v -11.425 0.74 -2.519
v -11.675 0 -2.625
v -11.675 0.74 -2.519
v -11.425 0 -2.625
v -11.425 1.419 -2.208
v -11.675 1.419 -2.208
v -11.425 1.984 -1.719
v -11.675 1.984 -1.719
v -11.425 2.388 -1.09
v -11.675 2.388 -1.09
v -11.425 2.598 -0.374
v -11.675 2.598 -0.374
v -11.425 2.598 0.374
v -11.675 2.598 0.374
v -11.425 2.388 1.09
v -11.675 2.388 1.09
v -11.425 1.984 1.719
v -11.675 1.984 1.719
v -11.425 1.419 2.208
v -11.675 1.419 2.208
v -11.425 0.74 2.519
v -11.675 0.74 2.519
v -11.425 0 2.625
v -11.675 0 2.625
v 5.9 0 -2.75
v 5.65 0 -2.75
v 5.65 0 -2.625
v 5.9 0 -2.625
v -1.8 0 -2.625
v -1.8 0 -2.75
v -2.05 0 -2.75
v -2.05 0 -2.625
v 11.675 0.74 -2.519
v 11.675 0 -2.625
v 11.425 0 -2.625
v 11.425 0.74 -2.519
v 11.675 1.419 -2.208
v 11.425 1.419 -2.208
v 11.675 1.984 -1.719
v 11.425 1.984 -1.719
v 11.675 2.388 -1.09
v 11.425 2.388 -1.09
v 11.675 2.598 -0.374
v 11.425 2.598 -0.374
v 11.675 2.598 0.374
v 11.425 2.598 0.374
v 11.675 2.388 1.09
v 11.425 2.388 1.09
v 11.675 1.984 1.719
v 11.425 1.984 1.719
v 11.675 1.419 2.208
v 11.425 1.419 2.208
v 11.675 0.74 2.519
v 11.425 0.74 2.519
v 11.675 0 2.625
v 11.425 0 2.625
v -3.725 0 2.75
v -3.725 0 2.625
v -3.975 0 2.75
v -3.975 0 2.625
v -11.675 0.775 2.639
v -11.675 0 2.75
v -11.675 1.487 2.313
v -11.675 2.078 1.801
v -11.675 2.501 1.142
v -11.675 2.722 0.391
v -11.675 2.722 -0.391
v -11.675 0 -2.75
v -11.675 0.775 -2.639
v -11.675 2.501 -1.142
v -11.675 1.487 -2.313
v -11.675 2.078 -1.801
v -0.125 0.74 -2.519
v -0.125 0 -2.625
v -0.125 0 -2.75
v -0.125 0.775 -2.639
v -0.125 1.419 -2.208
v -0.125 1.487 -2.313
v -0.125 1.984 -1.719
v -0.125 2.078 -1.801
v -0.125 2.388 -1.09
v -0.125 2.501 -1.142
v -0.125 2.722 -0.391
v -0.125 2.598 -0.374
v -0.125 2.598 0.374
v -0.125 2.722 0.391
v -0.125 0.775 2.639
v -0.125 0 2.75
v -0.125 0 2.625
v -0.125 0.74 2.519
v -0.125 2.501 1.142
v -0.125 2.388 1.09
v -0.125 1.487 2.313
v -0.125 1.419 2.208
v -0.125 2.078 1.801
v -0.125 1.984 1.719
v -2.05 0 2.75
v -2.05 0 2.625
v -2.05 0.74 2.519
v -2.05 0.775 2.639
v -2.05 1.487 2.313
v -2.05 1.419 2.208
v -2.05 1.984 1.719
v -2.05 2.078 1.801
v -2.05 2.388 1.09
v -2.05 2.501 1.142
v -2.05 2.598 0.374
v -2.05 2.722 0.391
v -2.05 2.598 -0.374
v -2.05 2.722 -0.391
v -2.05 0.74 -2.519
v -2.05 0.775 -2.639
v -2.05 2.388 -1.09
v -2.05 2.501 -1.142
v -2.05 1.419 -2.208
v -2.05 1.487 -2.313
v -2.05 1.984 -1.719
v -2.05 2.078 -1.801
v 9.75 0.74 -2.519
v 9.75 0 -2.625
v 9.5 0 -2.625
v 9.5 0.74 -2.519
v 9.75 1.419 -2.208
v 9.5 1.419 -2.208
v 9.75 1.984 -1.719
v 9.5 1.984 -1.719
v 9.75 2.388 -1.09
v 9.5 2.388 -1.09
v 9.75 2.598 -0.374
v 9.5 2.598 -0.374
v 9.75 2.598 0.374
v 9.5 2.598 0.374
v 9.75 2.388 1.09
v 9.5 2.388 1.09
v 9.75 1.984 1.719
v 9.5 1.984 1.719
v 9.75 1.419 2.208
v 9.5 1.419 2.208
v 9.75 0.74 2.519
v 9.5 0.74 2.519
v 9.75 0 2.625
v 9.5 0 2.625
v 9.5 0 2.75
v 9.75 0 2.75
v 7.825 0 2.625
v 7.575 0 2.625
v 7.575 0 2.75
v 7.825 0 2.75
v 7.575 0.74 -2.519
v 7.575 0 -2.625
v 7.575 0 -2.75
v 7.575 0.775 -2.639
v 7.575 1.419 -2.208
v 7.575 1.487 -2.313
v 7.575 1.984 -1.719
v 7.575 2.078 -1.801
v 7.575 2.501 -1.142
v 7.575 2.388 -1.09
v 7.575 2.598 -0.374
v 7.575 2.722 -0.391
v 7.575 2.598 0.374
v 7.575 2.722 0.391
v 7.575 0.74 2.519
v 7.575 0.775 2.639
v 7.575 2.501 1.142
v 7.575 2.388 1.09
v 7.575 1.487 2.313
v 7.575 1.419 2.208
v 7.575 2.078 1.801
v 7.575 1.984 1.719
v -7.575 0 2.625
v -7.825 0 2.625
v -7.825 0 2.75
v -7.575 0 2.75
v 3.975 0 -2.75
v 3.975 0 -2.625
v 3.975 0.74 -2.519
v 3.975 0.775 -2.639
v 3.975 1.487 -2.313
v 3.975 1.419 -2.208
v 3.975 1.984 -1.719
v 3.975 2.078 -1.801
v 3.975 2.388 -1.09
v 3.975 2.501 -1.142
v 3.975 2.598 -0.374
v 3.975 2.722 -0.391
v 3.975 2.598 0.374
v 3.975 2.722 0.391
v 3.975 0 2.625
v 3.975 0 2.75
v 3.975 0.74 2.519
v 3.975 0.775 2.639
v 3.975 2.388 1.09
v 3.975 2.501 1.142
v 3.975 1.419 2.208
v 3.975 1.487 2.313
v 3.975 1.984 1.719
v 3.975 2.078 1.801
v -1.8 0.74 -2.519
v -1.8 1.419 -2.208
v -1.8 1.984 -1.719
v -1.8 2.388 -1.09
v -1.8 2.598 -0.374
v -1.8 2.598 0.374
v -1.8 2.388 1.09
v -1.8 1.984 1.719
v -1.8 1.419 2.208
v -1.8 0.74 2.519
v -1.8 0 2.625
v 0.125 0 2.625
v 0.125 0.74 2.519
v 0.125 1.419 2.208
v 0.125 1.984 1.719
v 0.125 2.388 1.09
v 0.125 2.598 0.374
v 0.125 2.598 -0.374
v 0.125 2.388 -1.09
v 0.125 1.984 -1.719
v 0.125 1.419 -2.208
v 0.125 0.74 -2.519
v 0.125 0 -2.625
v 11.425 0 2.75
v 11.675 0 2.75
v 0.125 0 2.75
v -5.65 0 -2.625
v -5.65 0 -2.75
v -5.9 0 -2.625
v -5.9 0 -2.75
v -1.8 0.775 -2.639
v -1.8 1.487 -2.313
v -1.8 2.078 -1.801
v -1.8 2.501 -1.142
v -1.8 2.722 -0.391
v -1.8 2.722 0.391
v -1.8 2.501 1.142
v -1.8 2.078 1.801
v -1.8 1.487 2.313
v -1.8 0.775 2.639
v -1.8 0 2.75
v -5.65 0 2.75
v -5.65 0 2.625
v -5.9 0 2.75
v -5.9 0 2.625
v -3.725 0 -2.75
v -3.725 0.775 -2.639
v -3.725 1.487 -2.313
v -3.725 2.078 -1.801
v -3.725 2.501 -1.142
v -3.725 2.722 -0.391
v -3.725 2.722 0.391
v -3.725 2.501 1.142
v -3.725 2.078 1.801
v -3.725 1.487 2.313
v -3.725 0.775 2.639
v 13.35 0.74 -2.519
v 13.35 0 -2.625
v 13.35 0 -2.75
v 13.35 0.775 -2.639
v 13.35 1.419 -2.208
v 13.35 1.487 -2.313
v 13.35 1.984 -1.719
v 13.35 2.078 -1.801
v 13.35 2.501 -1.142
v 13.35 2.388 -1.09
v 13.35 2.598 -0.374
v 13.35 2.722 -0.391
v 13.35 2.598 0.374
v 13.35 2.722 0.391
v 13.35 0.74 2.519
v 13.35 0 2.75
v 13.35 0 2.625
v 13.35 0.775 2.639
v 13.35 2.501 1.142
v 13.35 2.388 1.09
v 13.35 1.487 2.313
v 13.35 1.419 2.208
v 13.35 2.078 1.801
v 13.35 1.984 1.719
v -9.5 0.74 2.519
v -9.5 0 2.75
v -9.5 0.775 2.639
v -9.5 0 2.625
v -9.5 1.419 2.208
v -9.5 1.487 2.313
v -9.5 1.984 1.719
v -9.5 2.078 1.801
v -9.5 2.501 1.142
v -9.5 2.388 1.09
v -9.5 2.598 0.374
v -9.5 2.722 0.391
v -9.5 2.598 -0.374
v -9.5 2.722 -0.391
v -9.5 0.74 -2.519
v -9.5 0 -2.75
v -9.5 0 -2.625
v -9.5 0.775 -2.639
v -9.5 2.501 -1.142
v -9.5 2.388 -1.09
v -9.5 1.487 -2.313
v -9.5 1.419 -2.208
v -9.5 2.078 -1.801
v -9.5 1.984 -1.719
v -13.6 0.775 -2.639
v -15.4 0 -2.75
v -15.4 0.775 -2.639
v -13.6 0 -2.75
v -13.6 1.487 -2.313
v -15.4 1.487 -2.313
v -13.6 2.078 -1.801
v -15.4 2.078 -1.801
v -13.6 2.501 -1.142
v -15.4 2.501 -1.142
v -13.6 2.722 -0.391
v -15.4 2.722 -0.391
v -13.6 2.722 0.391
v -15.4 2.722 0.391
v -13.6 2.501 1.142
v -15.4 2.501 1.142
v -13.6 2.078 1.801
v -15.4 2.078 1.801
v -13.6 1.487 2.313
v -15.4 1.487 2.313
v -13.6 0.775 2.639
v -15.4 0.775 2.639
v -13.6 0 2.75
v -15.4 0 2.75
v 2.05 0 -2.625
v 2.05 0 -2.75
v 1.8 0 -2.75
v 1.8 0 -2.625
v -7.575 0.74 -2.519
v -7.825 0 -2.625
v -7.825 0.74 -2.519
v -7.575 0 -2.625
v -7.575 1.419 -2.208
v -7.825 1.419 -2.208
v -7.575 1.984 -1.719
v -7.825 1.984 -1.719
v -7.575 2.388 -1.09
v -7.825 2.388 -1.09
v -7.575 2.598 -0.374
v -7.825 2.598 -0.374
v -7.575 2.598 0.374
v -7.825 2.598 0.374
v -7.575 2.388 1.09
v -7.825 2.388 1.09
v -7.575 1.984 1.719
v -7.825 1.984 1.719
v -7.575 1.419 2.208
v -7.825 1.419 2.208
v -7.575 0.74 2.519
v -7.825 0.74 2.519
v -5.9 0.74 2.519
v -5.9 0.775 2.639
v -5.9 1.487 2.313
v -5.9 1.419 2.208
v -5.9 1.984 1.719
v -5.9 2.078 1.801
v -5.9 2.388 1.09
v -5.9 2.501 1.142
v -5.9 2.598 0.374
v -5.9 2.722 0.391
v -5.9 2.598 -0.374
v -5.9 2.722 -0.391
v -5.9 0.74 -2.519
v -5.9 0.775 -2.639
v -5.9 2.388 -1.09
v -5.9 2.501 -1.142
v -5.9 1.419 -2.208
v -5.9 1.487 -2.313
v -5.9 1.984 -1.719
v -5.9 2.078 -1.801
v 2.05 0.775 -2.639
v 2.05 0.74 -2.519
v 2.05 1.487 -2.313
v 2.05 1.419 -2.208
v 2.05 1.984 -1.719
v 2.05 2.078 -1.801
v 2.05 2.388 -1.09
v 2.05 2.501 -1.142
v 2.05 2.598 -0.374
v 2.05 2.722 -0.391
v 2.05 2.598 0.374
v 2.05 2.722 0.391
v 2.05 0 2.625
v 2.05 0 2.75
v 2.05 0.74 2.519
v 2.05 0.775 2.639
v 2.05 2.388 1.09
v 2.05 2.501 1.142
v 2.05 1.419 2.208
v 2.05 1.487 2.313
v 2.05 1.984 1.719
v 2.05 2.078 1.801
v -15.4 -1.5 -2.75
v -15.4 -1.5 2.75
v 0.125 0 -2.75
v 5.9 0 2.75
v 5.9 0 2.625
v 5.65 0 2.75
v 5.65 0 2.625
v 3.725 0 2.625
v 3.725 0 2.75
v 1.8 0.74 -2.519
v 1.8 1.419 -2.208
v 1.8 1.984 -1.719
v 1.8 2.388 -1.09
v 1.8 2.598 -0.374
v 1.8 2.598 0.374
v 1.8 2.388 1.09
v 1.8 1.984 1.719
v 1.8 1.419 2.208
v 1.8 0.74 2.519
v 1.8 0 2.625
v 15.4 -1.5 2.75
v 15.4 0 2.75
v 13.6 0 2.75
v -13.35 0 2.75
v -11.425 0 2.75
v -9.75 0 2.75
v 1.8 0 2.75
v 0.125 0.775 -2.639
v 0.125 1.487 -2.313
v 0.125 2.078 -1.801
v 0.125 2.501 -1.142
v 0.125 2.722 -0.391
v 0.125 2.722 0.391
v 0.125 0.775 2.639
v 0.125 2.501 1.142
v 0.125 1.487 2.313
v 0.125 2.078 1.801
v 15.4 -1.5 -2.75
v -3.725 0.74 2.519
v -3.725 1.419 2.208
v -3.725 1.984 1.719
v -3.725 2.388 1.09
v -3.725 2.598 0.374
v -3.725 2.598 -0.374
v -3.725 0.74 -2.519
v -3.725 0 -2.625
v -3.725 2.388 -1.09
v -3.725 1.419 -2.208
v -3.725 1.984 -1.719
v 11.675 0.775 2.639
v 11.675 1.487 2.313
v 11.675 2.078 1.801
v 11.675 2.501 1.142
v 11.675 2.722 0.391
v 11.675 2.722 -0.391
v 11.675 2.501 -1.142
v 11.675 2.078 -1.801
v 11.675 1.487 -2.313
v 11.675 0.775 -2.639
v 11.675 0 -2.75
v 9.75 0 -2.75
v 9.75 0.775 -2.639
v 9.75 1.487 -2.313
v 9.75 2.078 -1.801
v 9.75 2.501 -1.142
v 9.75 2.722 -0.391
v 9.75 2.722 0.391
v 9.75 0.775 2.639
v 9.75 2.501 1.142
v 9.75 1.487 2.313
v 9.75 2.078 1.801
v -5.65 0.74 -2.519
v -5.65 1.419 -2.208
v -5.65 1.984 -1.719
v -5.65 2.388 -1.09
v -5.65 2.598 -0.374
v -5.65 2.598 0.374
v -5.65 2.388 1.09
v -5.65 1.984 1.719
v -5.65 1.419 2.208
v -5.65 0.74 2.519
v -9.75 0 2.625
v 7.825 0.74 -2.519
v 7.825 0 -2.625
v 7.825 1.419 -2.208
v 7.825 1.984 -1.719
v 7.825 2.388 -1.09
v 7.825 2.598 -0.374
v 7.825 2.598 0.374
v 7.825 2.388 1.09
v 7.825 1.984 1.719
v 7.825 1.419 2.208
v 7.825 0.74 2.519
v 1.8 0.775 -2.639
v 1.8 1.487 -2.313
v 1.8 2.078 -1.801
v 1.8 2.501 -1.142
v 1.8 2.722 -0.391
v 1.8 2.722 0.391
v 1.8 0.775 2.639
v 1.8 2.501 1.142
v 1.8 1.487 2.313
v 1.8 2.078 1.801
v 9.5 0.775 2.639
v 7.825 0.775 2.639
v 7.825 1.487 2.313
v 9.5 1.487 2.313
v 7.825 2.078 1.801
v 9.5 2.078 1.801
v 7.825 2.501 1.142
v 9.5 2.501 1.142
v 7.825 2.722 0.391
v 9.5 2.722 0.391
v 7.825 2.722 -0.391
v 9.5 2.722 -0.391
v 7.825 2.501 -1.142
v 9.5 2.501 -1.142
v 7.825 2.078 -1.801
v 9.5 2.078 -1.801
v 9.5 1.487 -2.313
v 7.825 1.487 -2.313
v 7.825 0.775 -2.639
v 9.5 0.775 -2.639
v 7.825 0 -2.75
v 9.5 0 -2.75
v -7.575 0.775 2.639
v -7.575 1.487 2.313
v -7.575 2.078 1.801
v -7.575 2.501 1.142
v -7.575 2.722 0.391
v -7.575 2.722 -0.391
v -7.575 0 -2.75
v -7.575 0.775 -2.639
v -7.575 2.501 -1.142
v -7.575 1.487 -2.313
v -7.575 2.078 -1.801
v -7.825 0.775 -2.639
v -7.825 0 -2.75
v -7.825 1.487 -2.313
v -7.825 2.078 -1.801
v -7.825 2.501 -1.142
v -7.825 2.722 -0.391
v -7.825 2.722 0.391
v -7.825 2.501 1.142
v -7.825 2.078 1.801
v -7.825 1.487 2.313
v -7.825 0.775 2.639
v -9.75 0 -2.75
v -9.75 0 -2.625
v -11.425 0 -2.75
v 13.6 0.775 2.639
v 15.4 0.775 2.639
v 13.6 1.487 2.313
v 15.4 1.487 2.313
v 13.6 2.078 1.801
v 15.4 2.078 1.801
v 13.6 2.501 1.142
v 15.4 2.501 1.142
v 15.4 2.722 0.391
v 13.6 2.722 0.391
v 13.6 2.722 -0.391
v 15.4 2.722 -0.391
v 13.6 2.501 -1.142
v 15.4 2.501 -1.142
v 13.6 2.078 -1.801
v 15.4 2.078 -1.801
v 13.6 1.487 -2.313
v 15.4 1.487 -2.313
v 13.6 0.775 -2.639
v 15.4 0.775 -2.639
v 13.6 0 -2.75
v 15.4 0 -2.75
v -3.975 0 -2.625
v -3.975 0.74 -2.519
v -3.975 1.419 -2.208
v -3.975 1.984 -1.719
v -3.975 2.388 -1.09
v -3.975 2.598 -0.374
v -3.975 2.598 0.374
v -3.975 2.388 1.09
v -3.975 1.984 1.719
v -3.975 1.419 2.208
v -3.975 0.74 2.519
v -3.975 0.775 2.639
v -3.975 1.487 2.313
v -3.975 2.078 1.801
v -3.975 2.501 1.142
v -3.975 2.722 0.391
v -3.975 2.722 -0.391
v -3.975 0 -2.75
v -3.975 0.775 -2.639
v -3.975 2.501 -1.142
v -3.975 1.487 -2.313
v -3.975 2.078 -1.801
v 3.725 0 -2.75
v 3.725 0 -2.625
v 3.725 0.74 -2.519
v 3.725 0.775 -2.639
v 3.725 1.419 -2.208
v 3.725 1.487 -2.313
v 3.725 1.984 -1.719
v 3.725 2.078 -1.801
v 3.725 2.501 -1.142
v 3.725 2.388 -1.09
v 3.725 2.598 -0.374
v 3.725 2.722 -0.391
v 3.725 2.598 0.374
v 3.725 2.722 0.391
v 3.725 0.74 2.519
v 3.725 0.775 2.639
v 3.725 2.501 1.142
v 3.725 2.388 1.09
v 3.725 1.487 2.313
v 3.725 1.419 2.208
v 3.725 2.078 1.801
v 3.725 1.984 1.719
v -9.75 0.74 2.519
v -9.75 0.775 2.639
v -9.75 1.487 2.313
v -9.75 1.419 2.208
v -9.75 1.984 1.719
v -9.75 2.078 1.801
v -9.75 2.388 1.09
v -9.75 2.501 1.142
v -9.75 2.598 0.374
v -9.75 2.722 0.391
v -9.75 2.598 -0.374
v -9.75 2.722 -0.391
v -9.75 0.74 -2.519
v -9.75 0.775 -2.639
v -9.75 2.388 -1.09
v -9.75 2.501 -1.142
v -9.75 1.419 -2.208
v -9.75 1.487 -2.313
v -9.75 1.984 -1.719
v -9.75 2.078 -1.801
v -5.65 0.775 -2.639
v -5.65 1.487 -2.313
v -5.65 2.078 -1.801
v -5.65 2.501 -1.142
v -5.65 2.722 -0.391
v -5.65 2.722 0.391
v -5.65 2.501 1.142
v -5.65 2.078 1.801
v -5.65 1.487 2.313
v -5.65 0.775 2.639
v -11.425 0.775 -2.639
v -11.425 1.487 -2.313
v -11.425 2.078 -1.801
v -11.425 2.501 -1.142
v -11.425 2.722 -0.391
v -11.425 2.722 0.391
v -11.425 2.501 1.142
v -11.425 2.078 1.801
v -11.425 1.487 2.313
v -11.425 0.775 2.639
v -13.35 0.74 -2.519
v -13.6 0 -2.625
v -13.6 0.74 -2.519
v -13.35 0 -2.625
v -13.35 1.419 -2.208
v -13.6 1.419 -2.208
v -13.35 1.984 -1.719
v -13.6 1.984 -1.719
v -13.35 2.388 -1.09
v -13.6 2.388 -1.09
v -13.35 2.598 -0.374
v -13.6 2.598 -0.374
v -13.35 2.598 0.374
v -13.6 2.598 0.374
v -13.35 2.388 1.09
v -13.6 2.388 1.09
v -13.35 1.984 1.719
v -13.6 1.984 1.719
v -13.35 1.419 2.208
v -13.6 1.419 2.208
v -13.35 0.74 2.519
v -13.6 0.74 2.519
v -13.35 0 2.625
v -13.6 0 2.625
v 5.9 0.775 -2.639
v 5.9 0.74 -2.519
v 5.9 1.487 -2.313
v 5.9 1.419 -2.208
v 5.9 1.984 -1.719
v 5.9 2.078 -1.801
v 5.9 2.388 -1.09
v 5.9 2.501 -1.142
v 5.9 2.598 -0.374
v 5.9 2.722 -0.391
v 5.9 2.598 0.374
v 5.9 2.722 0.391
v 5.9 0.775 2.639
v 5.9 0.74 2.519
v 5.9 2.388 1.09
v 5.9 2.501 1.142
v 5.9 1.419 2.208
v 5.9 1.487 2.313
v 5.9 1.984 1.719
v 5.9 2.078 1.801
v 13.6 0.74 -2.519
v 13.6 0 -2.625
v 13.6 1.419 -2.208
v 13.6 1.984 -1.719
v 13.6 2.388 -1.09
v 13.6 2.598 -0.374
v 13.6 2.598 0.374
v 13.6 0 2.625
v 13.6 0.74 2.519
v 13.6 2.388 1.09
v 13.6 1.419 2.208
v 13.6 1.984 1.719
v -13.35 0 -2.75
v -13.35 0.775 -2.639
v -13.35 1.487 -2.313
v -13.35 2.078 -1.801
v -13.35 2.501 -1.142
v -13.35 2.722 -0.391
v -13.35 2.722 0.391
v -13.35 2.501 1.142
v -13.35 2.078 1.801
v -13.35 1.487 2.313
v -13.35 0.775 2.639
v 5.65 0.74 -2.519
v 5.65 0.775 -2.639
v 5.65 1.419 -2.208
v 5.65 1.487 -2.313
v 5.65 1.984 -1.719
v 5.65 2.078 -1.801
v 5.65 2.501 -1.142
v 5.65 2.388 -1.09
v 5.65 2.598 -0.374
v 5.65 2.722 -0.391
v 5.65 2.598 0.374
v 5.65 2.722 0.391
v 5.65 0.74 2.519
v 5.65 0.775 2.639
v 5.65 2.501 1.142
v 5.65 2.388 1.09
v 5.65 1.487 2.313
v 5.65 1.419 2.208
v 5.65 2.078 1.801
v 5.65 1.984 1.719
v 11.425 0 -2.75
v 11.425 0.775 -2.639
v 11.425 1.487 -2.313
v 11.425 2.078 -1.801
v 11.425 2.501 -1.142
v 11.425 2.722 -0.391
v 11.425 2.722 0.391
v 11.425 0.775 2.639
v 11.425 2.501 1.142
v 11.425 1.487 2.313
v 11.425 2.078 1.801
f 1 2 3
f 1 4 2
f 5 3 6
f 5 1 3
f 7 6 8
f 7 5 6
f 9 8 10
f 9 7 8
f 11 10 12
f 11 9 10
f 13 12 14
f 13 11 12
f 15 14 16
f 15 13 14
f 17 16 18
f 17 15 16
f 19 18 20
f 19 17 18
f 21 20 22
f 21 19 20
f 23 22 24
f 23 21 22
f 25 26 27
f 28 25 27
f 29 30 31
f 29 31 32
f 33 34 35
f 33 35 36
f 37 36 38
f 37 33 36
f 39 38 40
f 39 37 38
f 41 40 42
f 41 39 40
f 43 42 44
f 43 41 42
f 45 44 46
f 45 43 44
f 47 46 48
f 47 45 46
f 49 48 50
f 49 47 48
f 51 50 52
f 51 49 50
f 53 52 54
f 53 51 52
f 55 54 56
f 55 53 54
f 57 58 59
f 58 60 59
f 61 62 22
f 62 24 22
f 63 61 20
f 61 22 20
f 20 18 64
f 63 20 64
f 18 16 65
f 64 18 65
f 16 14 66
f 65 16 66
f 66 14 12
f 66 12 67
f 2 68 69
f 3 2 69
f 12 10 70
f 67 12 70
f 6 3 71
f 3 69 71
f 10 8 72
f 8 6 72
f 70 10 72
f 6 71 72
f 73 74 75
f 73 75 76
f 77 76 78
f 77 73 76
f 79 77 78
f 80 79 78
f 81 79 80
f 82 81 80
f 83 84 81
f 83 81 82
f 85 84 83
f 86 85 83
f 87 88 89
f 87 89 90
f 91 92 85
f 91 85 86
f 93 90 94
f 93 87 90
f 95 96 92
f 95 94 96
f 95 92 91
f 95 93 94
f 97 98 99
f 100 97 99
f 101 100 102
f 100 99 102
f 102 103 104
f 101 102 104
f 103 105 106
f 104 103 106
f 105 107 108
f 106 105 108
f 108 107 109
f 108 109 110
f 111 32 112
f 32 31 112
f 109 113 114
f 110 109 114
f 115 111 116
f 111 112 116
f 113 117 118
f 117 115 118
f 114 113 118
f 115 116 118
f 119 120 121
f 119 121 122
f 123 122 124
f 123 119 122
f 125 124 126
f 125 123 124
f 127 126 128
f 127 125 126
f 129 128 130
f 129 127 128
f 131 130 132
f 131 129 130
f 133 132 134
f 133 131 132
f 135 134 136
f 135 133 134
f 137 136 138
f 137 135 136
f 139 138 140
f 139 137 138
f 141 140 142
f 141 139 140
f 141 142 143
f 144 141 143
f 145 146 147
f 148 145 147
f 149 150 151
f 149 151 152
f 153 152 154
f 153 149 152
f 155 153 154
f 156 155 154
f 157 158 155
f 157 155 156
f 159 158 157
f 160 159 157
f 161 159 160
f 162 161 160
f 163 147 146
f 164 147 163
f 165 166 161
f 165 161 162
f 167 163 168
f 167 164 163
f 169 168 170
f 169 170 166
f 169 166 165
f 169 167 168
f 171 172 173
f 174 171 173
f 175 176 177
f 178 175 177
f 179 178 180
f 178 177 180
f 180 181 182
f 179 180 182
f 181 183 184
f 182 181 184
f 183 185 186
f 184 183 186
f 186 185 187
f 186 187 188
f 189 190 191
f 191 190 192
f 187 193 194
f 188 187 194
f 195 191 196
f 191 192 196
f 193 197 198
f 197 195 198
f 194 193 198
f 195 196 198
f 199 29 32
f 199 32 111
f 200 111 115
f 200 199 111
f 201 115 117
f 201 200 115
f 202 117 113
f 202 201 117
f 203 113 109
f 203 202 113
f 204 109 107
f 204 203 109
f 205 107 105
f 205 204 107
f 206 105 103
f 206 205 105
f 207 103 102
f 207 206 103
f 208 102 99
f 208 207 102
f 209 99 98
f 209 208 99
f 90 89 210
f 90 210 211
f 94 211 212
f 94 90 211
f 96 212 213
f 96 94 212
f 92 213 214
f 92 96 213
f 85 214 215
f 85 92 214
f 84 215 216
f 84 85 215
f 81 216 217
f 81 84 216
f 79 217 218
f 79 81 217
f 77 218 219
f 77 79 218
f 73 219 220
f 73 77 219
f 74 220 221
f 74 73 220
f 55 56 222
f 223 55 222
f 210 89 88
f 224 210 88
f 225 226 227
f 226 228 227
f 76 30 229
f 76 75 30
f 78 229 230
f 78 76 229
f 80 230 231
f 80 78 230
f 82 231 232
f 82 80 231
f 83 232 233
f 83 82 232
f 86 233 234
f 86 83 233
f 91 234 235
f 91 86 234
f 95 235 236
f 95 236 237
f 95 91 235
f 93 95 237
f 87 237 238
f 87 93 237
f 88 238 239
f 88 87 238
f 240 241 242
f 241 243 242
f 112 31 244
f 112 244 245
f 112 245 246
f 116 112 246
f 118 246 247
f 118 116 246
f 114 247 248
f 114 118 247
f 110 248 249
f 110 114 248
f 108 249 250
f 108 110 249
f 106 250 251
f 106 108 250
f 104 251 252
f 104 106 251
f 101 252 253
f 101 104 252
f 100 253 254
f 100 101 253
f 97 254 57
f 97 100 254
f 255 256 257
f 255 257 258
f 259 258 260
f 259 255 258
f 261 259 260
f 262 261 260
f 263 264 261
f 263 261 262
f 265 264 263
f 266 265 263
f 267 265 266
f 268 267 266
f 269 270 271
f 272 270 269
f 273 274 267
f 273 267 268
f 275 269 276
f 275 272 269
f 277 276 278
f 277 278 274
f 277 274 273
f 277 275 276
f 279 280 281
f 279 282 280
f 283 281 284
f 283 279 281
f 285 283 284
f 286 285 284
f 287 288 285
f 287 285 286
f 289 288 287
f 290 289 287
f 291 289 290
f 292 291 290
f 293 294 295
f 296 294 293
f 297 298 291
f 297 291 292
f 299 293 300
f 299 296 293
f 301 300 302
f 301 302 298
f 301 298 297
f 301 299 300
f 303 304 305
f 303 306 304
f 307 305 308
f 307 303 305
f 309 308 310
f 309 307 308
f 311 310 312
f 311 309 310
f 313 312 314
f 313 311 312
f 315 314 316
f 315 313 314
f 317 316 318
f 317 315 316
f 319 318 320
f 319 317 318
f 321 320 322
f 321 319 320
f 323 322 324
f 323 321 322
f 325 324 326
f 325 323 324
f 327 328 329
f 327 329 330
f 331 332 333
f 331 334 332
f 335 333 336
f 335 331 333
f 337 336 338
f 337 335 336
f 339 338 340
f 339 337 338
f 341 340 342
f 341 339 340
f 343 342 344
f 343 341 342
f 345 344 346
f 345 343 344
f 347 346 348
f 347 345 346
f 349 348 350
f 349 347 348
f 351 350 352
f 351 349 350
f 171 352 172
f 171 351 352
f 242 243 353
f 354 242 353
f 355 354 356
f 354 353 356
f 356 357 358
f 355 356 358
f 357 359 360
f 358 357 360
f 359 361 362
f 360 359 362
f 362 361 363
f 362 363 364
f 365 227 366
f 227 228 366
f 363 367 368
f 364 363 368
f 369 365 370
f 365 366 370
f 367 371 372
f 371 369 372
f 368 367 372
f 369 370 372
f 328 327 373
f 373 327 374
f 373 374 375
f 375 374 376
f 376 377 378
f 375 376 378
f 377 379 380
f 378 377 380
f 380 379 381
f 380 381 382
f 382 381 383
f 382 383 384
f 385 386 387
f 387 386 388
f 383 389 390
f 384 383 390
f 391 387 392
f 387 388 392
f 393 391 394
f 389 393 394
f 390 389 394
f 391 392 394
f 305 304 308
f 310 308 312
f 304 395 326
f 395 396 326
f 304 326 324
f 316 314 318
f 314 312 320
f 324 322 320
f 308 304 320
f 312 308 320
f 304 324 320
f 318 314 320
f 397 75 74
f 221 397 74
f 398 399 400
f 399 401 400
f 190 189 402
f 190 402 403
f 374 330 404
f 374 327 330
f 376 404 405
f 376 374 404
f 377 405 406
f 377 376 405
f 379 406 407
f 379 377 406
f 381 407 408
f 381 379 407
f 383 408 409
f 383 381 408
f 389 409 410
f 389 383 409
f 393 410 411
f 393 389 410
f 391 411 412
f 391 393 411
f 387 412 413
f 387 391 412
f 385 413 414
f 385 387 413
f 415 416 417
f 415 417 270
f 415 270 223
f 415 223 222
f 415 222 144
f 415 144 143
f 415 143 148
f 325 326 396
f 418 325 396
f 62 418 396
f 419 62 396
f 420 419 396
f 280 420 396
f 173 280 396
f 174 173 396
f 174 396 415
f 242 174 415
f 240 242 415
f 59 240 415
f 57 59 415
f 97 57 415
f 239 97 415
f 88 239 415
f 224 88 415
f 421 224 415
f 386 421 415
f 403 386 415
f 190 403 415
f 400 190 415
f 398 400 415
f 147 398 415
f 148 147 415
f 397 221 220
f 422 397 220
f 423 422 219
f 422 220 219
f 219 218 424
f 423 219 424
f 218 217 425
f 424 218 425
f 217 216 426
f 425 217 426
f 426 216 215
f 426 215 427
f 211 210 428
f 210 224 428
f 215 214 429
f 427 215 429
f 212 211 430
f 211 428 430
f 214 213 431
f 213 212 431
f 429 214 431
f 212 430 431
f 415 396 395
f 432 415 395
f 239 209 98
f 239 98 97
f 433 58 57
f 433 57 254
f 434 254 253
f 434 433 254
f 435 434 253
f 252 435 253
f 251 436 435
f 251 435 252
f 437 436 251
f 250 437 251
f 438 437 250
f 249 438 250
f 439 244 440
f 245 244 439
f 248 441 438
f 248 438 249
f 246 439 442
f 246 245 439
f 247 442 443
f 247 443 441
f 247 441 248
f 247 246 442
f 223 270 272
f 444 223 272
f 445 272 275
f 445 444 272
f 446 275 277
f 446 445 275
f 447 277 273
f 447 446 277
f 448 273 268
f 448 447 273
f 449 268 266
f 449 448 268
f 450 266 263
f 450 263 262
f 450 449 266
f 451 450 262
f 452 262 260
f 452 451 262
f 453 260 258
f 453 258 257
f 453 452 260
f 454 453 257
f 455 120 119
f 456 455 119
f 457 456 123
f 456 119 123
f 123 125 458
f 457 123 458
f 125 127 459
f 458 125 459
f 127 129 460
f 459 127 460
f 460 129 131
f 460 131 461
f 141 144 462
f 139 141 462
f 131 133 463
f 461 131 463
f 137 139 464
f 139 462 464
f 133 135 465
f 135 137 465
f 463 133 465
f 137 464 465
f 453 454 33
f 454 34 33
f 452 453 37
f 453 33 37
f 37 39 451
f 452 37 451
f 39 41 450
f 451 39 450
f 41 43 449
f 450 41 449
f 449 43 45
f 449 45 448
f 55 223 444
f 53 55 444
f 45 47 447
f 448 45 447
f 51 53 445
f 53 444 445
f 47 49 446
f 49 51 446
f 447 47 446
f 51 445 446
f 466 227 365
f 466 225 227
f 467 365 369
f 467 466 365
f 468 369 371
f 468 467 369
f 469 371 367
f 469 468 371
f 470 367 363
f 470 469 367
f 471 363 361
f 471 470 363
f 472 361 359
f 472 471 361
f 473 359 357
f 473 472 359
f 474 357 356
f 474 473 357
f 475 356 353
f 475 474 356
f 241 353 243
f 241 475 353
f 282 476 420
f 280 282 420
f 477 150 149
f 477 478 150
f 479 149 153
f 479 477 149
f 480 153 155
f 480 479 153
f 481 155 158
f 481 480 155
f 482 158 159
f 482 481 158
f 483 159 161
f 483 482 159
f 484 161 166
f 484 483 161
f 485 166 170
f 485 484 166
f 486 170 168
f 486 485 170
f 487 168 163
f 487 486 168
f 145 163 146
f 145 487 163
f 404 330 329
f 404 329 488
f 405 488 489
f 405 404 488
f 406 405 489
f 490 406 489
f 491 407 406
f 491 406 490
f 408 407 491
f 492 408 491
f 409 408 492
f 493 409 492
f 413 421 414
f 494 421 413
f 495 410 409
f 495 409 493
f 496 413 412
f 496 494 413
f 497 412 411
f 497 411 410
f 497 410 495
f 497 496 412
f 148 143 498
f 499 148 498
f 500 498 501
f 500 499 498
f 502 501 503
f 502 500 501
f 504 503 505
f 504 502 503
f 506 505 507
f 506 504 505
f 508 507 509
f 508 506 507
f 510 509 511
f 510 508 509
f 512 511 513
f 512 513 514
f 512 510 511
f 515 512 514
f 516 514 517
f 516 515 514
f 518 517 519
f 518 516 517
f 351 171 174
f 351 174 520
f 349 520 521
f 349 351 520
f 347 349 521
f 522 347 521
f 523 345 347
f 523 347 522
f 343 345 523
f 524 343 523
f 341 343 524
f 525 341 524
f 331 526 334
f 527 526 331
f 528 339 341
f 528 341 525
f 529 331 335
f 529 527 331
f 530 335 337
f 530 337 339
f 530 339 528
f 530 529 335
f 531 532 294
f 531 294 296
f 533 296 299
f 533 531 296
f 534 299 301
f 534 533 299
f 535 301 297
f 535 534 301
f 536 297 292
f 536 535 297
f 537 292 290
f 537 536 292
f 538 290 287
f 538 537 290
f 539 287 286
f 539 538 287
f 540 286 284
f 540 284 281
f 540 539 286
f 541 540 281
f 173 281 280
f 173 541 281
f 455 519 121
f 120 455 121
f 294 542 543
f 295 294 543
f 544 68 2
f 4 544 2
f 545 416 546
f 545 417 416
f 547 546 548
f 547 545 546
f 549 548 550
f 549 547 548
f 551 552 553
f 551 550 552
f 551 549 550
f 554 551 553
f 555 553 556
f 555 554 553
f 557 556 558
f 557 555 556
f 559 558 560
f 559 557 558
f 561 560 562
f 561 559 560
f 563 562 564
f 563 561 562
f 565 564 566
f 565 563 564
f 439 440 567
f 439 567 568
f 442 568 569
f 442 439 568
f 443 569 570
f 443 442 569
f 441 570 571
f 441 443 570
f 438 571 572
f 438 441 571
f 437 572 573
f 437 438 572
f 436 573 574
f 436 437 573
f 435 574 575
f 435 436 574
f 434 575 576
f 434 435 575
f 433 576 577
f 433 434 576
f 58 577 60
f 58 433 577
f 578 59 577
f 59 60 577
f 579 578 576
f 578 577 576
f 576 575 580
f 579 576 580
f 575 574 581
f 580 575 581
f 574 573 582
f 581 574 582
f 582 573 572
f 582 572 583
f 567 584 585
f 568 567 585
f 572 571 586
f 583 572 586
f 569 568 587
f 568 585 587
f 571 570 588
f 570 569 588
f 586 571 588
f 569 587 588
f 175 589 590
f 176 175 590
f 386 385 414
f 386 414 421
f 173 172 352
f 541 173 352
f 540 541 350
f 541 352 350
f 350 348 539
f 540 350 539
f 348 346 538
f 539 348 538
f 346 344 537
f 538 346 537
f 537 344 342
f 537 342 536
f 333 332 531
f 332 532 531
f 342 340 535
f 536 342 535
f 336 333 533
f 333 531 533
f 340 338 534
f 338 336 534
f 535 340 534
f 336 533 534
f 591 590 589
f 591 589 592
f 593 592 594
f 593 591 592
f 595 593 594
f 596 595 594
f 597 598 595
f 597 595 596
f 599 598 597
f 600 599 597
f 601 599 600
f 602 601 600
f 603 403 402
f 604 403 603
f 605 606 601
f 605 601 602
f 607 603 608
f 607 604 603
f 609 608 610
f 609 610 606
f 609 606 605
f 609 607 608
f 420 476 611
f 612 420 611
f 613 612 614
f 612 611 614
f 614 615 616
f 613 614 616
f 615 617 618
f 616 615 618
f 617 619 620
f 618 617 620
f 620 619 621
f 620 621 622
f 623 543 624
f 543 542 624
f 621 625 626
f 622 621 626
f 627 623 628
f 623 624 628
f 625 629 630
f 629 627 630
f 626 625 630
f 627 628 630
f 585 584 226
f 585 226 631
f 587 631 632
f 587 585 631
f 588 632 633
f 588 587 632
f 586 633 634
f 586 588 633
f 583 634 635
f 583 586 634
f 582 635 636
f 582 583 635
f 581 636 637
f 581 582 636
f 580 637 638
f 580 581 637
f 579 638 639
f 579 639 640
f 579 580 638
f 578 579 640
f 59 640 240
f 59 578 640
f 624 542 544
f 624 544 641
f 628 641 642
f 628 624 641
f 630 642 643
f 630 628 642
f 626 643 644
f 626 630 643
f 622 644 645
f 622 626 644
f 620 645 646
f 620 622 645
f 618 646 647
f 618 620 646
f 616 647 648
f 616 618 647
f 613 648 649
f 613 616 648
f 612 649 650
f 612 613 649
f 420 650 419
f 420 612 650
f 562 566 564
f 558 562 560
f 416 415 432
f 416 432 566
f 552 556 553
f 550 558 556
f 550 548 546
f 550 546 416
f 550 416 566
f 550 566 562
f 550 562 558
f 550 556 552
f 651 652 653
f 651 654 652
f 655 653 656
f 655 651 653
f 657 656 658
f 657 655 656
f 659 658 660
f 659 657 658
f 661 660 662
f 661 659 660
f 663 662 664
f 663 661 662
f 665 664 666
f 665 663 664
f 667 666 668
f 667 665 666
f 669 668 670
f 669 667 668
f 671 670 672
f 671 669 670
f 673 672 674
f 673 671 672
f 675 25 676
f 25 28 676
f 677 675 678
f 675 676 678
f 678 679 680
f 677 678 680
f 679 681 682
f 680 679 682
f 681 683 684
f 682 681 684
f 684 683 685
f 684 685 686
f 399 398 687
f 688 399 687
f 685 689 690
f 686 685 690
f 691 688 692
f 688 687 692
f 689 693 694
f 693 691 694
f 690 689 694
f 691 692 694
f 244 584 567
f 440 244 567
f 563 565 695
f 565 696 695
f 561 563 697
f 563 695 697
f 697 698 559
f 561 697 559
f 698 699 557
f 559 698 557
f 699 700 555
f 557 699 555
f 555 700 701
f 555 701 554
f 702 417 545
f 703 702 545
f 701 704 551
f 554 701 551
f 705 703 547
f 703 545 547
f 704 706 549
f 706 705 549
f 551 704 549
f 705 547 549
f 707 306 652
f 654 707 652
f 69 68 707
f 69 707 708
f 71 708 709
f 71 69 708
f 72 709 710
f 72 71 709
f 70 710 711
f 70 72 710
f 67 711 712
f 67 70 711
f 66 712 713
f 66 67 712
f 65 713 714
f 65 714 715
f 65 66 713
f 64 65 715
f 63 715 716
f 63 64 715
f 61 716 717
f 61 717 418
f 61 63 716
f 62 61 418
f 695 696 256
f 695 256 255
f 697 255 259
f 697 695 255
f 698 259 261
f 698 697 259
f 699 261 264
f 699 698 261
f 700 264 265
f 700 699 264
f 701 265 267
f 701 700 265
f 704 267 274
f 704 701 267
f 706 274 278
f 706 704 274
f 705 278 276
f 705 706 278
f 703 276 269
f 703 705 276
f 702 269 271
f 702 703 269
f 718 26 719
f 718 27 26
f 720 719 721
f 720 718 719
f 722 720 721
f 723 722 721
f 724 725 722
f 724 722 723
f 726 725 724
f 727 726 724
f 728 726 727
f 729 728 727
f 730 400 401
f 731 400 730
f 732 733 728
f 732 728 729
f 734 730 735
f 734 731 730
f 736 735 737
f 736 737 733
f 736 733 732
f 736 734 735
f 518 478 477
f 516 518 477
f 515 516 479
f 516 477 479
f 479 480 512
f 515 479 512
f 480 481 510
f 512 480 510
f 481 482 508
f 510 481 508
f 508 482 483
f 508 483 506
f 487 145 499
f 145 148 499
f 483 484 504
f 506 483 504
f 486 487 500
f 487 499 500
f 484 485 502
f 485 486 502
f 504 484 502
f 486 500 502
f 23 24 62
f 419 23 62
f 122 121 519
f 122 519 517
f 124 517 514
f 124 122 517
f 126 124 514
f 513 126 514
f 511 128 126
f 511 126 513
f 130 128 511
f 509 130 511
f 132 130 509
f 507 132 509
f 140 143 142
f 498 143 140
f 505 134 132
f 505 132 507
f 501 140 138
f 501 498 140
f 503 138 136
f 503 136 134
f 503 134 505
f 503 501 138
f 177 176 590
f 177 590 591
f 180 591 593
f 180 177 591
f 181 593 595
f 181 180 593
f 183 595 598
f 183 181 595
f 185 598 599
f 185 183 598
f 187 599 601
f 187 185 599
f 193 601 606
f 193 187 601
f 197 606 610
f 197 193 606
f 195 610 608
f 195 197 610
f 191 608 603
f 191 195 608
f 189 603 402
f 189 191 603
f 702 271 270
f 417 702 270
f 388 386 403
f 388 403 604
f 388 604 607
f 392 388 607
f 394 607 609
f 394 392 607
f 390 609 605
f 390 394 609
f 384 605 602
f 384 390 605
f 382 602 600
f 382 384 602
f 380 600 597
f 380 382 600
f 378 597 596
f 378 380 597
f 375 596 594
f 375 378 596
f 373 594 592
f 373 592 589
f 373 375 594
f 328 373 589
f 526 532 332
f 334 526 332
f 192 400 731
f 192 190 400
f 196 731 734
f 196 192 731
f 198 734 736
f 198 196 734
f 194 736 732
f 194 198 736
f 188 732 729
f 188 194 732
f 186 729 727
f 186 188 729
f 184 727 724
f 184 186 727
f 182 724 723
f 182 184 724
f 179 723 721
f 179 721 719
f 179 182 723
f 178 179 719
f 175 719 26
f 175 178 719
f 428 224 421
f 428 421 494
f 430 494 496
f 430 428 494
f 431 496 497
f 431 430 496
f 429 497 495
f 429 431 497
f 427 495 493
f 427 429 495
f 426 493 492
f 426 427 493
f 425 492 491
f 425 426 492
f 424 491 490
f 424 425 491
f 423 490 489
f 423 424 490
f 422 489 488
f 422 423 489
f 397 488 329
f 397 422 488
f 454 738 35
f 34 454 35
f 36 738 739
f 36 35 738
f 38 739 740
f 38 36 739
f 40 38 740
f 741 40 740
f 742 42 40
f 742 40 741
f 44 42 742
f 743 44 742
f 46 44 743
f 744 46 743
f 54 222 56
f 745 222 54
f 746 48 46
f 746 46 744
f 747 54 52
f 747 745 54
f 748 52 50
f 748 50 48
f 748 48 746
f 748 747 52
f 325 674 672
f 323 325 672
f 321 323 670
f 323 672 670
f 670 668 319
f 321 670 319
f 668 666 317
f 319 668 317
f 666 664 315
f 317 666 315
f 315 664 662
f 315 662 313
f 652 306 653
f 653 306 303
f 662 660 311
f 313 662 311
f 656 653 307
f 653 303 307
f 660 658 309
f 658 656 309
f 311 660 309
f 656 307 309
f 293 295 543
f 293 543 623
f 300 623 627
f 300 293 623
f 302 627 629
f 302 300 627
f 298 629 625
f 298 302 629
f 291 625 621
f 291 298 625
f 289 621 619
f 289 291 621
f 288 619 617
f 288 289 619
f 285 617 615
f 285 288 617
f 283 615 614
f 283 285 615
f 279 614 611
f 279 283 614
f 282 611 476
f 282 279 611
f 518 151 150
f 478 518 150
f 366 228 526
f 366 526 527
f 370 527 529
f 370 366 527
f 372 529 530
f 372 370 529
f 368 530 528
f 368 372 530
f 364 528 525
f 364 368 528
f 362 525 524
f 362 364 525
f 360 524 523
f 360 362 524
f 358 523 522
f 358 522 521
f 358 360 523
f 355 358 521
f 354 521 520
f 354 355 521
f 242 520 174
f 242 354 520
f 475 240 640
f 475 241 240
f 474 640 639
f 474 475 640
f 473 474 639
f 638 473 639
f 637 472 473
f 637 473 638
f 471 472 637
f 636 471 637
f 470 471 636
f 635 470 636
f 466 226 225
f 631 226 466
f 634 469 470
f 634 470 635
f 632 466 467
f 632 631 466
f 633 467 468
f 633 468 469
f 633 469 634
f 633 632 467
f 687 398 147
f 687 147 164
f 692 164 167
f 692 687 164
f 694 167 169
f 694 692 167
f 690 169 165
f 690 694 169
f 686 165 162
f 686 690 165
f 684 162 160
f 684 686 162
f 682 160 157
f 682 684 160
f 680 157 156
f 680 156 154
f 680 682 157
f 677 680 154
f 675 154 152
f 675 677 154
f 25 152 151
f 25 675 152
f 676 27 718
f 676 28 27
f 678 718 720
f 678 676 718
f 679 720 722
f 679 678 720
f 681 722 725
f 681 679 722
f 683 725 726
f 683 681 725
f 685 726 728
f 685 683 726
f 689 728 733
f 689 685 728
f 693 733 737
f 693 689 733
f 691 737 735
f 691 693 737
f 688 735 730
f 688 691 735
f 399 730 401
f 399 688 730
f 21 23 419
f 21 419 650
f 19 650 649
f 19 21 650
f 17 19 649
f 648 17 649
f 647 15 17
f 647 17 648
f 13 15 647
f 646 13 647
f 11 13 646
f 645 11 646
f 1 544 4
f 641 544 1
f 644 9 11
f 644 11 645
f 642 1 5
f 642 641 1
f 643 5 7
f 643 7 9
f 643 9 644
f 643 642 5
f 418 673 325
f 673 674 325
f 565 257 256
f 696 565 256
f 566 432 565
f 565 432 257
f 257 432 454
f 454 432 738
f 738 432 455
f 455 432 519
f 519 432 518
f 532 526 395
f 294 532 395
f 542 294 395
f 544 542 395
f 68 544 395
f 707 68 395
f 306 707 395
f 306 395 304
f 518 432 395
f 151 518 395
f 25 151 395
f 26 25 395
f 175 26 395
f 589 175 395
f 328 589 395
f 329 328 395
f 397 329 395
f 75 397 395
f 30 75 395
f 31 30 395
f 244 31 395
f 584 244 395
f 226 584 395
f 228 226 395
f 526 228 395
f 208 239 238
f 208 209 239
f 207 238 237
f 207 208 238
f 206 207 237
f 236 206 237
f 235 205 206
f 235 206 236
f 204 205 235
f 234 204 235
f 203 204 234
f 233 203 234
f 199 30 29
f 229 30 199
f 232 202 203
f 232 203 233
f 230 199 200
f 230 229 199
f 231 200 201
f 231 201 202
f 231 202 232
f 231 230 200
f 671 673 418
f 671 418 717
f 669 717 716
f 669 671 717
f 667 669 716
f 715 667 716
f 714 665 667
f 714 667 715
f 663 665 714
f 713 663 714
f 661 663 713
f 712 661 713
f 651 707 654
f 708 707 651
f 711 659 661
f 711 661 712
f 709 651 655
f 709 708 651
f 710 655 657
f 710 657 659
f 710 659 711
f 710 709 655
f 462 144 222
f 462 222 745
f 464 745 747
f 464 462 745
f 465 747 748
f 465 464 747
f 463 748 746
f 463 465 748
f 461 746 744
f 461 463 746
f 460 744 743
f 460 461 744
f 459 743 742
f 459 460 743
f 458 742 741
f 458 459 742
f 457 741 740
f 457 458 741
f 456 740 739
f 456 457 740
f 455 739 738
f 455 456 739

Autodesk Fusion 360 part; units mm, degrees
sketch "Sketch1" plane through (0, 0, 0) normal (1, 0, 0) x (0, 1, 0)
  circle A0 centre (0, 0) radius 2.75
  line L0 (0, 0) -> (0, 2.75) construction
  line L1 (0, 0) -> (0, -2.75) construction
  line L2 (0, 2.75) -> (-1.5, 2.75)
  line L3 (-1.5, 2.75) -> (-1.5, -2.75)
  line L4 (-1.5, -2.75) -> (0, -2.75)
  line L5 (0, -2.75) -> (0, 2.75)
  dimension "d1" = 5.5
  dimension "d79" = 1.5
extrude "Extrude1" add sketch "Sketch1" along normal mid plane 30.8 contours A0 L5 | A0 L3 L5 | A0 L3
ref_plane "WorkPlane1" through (0, 0, 0) normal (1, 0, 0) x (0, 1, 0)
sketch "Sketch2" plane through (0, 0, 0) normal (1, 0, 0) x (0, 1, 0)
  circle A0 centre (0, 0) radius 2.75
  circle A1 centre (0, 0) radius 2.625
  dimension "d5" = 5.5
  dimension "d6" = 5.25
extrude "Extrude2" cut sketch "Sketch2" along normal mid plane 0.25
ref_plane "WorkPlane2" through (7.7, 0, 0) normal (1, 0, 0) x (0, 1, 0)
sketch "Sketch3" plane through (7.7, 0, 0) normal (1, 0, 0) x (0, 1, 0)
  circle A0 centre (0, 0) radius 2.75
  circle A1 centre (0, 0) radius 2.625
  dimension "d10" = 5.5
  dimension "d11" = 5.25
extrude "Extrude3" cut sketch "Sketch3" along normal mid plane 0.25
ref_plane "WorkPlane3" through (11.55, 0, 0) normal (1, 0, 0) x (0, 1, 0)
sketch "Sketch4" plane through (11.55, 0, 0) normal (1, 0, 0) x (0, 1, 0)
  circle A0 centre (0, 0) radius 2.75
  circle A1 centre (0, 0) radius 2.625
  dimension "d15" = 5.5
  dimension "d16" = 5.25
extrude "Extrude4" cut sketch "Sketch4" along normal mid plane 0.25
ref_plane "WorkPlane4" through (13.475, 0, 0) normal (1, 0, 0) x (0, 1, 0)
sketch "Sketch5" plane through (13.475, 0, 0) normal (1, 0, 0) x (0, 1, 0)
  circle A0 centre (0, 0) radius 2.75
  circle A1 centre (0, 0) radius 2.625
  dimension "d20" = 5.5
  dimension "d21" = 5.25
extrude "Extrude5" cut sketch "Sketch5" along normal mid plane 0.25
ref_plane "WorkPlane5" through (9.625, 0, 0) normal (1, 0, 0) x (0, 1, 0)
sketch "Sketch6" plane through (9.625, 0, 0) normal (1, 0, 0) x (0, 1, 0)
  circle A0 centre (0, 0) radius 2.75
  circle A1 centre (0, 0) radius 2.625
  dimension "d25" = 5.5
  dimension "d26" = 5.25
extrude "Extrude6" cut sketch "Sketch6" along normal mid plane 0.25
ref_plane "WorkPlane6" through (5.775, 0, 0) normal (1, 0, 0) x (0, 1, 0)
sketch "Sketch7" plane through (5.775, 0, 0) normal (1, 0, 0) x (0, 1, 0)
  circle A0 centre (0, 0) radius 2.75
  circle A1 centre (0, 0) radius 2.625
  dimension "d30" = 5.5
  dimension "d31" = 5.25
extrude "Extrude7" cut sketch "Sketch7" along normal mid plane 0.25
ref_plane "WorkPlane7" through (3.85, 0, 0) normal (1, 0, 0) x (0, 1, 0)
sketch "Sketch8" plane through (3.85, 0, 0) normal (1, 0, 0) x (0, 1, 0)
  circle A0 centre (0, 0) radius 2.75
  circle A1 centre (0, 0) radius 2.625
  dimension "d35" = 5.5
  dimension "d36" = 5.25
extrude "Extrude8" cut sketch "Sketch8" along normal mid plane 0.25
ref_plane "WorkPlane8" through (1.925, 0, 0) normal (1, 0, 0) x (0, 1, 0)
sketch "Sketch9" plane through (1.925, 0, 0) normal (1, 0, 0) x (0, 1, 0)
  circle A0 centre (0, 0) radius 2.75
  circle A1 centre (0, 0) radius 2.625
  dimension "d40" = 5.5
  dimension "d41" = 5.25
extrude "Extrude9" cut sketch "Sketch9" along normal mid plane 0.25
ref_plane "WorkPlane9" through (-13.475, 0, 0) normal (-1, 0, 0) x (0, -1, 0)
sketch "Sketch10" plane through (-13.475, 0, 0) normal (-1, 0, 0) x (0, 1, 0)
  circle A0 centre (0, 0) radius 2.75
  circle A1 centre (0, 0) radius 2.625
  dimension "d45" = 5.5
  dimension "d46" = 5.25
extrude "Extrude10" cut sketch "Sketch10" along normal mid plane 0.25
ref_plane "WorkPlane10" through (-11.55, 0, 0) normal (-1, 0, 0) x (0, -1, 0)
sketch "Sketch11" plane through (-11.55, 0, 0) normal (-1, 0, 0) x (0, 1, 0)
  circle A0 centre (0, 0) radius 2.75
  circle A1 centre (0, 0) radius 2.625
  dimension "d50" = 5.5
  dimension "d51" = 5.25
extrude "Extrude11" cut sketch "Sketch11" along normal mid plane 0.25
ref_plane "WorkPlane11" through (-9.625, 0, 0) normal (-1, 0, 0) x (0, -1, 0)
sketch "Sketch12" plane through (-9.625, 0, 0) normal (-1, 0, 0) x (0, 1, 0)
  circle A0 centre (0, 0) radius 2.75
  circle A1 centre (0, 0) radius 2.625
  dimension "d55" = 5.5
  dimension "d56" = 5.25
extrude "Extrude12" cut sketch "Sketch12" along normal mid plane 0.25
ref_plane "WorkPlane12" through (-7.7, 0, 0) normal (-1, 0, 0) x (0, -1, 0)
sketch "Sketch13" plane through (-7.7, 0, 0) normal (-1, 0, 0) x (0, 1, 0)
  circle A0 centre (0, 0) radius 2.75
  circle A1 centre (0, 0) radius 2.625
  dimension "d60" = 5.5
  dimension "d61" = 5.25
extrude "Extrude13" cut sketch "Sketch13" along normal mid plane 0.25
ref_plane "WorkPlane13" through (-5.775, 0, 0) normal (-1, 0, 0) x (0, -1, 0)
sketch "Sketch14" plane through (-5.775, 0, 0) normal (-1, 0, 0) x (0, 1, 0)
  circle A0 centre (0, 0) radius 2.75
  circle A1 centre (0, 0) radius 2.625
  dimension "d65" = 5.5
  dimension "d66" = 5.25
extrude "Extrude14" cut sketch "Sketch14" along normal mid plane 0.25
ref_plane "WorkPlane14" through (-3.85, 0, 0) normal (-1, 0, 0) x (0, -1, 0)
sketch "Sketch15" plane through (-3.85, 0, 0) normal (-1, 0, 0) x (0, 1, 0)
  circle A0 centre (0, 0) radius 2.75
  circle A1 centre (0, 0) radius 2.625
  dimension "d70" = 5.5
  dimension "d71" = 5.25
extrude "Extrude15" cut sketch "Sketch15" along normal mid plane 0.25
ref_plane "WorkPlane15" through (-1.925, 0, 0) normal (-1, 0, 0) x (0, -1, 0)
sketch "Sketch16" plane through (-1.925, 0, 0) normal (-1, 0, 0) x (0, 1, 0)
  circle A0 centre (0, 0) radius 2.75
  circle A1 centre (0, 0) radius 2.625
  dimension "d75" = 5.5
  dimension "d76" = 5.25
extrude "Extrude16" cut sketch "Sketch16" along normal mid plane 0.25
extrude "Extrude17" add sketch "Sketch1" along normal mid plane 30.8 contours A0 L3 L5 | A0 L2 L3 | A0 L3 L4
extrude "Extrude18" cut sketch "Sketch1" along normal mid plane 30.8 contours A0 L3
